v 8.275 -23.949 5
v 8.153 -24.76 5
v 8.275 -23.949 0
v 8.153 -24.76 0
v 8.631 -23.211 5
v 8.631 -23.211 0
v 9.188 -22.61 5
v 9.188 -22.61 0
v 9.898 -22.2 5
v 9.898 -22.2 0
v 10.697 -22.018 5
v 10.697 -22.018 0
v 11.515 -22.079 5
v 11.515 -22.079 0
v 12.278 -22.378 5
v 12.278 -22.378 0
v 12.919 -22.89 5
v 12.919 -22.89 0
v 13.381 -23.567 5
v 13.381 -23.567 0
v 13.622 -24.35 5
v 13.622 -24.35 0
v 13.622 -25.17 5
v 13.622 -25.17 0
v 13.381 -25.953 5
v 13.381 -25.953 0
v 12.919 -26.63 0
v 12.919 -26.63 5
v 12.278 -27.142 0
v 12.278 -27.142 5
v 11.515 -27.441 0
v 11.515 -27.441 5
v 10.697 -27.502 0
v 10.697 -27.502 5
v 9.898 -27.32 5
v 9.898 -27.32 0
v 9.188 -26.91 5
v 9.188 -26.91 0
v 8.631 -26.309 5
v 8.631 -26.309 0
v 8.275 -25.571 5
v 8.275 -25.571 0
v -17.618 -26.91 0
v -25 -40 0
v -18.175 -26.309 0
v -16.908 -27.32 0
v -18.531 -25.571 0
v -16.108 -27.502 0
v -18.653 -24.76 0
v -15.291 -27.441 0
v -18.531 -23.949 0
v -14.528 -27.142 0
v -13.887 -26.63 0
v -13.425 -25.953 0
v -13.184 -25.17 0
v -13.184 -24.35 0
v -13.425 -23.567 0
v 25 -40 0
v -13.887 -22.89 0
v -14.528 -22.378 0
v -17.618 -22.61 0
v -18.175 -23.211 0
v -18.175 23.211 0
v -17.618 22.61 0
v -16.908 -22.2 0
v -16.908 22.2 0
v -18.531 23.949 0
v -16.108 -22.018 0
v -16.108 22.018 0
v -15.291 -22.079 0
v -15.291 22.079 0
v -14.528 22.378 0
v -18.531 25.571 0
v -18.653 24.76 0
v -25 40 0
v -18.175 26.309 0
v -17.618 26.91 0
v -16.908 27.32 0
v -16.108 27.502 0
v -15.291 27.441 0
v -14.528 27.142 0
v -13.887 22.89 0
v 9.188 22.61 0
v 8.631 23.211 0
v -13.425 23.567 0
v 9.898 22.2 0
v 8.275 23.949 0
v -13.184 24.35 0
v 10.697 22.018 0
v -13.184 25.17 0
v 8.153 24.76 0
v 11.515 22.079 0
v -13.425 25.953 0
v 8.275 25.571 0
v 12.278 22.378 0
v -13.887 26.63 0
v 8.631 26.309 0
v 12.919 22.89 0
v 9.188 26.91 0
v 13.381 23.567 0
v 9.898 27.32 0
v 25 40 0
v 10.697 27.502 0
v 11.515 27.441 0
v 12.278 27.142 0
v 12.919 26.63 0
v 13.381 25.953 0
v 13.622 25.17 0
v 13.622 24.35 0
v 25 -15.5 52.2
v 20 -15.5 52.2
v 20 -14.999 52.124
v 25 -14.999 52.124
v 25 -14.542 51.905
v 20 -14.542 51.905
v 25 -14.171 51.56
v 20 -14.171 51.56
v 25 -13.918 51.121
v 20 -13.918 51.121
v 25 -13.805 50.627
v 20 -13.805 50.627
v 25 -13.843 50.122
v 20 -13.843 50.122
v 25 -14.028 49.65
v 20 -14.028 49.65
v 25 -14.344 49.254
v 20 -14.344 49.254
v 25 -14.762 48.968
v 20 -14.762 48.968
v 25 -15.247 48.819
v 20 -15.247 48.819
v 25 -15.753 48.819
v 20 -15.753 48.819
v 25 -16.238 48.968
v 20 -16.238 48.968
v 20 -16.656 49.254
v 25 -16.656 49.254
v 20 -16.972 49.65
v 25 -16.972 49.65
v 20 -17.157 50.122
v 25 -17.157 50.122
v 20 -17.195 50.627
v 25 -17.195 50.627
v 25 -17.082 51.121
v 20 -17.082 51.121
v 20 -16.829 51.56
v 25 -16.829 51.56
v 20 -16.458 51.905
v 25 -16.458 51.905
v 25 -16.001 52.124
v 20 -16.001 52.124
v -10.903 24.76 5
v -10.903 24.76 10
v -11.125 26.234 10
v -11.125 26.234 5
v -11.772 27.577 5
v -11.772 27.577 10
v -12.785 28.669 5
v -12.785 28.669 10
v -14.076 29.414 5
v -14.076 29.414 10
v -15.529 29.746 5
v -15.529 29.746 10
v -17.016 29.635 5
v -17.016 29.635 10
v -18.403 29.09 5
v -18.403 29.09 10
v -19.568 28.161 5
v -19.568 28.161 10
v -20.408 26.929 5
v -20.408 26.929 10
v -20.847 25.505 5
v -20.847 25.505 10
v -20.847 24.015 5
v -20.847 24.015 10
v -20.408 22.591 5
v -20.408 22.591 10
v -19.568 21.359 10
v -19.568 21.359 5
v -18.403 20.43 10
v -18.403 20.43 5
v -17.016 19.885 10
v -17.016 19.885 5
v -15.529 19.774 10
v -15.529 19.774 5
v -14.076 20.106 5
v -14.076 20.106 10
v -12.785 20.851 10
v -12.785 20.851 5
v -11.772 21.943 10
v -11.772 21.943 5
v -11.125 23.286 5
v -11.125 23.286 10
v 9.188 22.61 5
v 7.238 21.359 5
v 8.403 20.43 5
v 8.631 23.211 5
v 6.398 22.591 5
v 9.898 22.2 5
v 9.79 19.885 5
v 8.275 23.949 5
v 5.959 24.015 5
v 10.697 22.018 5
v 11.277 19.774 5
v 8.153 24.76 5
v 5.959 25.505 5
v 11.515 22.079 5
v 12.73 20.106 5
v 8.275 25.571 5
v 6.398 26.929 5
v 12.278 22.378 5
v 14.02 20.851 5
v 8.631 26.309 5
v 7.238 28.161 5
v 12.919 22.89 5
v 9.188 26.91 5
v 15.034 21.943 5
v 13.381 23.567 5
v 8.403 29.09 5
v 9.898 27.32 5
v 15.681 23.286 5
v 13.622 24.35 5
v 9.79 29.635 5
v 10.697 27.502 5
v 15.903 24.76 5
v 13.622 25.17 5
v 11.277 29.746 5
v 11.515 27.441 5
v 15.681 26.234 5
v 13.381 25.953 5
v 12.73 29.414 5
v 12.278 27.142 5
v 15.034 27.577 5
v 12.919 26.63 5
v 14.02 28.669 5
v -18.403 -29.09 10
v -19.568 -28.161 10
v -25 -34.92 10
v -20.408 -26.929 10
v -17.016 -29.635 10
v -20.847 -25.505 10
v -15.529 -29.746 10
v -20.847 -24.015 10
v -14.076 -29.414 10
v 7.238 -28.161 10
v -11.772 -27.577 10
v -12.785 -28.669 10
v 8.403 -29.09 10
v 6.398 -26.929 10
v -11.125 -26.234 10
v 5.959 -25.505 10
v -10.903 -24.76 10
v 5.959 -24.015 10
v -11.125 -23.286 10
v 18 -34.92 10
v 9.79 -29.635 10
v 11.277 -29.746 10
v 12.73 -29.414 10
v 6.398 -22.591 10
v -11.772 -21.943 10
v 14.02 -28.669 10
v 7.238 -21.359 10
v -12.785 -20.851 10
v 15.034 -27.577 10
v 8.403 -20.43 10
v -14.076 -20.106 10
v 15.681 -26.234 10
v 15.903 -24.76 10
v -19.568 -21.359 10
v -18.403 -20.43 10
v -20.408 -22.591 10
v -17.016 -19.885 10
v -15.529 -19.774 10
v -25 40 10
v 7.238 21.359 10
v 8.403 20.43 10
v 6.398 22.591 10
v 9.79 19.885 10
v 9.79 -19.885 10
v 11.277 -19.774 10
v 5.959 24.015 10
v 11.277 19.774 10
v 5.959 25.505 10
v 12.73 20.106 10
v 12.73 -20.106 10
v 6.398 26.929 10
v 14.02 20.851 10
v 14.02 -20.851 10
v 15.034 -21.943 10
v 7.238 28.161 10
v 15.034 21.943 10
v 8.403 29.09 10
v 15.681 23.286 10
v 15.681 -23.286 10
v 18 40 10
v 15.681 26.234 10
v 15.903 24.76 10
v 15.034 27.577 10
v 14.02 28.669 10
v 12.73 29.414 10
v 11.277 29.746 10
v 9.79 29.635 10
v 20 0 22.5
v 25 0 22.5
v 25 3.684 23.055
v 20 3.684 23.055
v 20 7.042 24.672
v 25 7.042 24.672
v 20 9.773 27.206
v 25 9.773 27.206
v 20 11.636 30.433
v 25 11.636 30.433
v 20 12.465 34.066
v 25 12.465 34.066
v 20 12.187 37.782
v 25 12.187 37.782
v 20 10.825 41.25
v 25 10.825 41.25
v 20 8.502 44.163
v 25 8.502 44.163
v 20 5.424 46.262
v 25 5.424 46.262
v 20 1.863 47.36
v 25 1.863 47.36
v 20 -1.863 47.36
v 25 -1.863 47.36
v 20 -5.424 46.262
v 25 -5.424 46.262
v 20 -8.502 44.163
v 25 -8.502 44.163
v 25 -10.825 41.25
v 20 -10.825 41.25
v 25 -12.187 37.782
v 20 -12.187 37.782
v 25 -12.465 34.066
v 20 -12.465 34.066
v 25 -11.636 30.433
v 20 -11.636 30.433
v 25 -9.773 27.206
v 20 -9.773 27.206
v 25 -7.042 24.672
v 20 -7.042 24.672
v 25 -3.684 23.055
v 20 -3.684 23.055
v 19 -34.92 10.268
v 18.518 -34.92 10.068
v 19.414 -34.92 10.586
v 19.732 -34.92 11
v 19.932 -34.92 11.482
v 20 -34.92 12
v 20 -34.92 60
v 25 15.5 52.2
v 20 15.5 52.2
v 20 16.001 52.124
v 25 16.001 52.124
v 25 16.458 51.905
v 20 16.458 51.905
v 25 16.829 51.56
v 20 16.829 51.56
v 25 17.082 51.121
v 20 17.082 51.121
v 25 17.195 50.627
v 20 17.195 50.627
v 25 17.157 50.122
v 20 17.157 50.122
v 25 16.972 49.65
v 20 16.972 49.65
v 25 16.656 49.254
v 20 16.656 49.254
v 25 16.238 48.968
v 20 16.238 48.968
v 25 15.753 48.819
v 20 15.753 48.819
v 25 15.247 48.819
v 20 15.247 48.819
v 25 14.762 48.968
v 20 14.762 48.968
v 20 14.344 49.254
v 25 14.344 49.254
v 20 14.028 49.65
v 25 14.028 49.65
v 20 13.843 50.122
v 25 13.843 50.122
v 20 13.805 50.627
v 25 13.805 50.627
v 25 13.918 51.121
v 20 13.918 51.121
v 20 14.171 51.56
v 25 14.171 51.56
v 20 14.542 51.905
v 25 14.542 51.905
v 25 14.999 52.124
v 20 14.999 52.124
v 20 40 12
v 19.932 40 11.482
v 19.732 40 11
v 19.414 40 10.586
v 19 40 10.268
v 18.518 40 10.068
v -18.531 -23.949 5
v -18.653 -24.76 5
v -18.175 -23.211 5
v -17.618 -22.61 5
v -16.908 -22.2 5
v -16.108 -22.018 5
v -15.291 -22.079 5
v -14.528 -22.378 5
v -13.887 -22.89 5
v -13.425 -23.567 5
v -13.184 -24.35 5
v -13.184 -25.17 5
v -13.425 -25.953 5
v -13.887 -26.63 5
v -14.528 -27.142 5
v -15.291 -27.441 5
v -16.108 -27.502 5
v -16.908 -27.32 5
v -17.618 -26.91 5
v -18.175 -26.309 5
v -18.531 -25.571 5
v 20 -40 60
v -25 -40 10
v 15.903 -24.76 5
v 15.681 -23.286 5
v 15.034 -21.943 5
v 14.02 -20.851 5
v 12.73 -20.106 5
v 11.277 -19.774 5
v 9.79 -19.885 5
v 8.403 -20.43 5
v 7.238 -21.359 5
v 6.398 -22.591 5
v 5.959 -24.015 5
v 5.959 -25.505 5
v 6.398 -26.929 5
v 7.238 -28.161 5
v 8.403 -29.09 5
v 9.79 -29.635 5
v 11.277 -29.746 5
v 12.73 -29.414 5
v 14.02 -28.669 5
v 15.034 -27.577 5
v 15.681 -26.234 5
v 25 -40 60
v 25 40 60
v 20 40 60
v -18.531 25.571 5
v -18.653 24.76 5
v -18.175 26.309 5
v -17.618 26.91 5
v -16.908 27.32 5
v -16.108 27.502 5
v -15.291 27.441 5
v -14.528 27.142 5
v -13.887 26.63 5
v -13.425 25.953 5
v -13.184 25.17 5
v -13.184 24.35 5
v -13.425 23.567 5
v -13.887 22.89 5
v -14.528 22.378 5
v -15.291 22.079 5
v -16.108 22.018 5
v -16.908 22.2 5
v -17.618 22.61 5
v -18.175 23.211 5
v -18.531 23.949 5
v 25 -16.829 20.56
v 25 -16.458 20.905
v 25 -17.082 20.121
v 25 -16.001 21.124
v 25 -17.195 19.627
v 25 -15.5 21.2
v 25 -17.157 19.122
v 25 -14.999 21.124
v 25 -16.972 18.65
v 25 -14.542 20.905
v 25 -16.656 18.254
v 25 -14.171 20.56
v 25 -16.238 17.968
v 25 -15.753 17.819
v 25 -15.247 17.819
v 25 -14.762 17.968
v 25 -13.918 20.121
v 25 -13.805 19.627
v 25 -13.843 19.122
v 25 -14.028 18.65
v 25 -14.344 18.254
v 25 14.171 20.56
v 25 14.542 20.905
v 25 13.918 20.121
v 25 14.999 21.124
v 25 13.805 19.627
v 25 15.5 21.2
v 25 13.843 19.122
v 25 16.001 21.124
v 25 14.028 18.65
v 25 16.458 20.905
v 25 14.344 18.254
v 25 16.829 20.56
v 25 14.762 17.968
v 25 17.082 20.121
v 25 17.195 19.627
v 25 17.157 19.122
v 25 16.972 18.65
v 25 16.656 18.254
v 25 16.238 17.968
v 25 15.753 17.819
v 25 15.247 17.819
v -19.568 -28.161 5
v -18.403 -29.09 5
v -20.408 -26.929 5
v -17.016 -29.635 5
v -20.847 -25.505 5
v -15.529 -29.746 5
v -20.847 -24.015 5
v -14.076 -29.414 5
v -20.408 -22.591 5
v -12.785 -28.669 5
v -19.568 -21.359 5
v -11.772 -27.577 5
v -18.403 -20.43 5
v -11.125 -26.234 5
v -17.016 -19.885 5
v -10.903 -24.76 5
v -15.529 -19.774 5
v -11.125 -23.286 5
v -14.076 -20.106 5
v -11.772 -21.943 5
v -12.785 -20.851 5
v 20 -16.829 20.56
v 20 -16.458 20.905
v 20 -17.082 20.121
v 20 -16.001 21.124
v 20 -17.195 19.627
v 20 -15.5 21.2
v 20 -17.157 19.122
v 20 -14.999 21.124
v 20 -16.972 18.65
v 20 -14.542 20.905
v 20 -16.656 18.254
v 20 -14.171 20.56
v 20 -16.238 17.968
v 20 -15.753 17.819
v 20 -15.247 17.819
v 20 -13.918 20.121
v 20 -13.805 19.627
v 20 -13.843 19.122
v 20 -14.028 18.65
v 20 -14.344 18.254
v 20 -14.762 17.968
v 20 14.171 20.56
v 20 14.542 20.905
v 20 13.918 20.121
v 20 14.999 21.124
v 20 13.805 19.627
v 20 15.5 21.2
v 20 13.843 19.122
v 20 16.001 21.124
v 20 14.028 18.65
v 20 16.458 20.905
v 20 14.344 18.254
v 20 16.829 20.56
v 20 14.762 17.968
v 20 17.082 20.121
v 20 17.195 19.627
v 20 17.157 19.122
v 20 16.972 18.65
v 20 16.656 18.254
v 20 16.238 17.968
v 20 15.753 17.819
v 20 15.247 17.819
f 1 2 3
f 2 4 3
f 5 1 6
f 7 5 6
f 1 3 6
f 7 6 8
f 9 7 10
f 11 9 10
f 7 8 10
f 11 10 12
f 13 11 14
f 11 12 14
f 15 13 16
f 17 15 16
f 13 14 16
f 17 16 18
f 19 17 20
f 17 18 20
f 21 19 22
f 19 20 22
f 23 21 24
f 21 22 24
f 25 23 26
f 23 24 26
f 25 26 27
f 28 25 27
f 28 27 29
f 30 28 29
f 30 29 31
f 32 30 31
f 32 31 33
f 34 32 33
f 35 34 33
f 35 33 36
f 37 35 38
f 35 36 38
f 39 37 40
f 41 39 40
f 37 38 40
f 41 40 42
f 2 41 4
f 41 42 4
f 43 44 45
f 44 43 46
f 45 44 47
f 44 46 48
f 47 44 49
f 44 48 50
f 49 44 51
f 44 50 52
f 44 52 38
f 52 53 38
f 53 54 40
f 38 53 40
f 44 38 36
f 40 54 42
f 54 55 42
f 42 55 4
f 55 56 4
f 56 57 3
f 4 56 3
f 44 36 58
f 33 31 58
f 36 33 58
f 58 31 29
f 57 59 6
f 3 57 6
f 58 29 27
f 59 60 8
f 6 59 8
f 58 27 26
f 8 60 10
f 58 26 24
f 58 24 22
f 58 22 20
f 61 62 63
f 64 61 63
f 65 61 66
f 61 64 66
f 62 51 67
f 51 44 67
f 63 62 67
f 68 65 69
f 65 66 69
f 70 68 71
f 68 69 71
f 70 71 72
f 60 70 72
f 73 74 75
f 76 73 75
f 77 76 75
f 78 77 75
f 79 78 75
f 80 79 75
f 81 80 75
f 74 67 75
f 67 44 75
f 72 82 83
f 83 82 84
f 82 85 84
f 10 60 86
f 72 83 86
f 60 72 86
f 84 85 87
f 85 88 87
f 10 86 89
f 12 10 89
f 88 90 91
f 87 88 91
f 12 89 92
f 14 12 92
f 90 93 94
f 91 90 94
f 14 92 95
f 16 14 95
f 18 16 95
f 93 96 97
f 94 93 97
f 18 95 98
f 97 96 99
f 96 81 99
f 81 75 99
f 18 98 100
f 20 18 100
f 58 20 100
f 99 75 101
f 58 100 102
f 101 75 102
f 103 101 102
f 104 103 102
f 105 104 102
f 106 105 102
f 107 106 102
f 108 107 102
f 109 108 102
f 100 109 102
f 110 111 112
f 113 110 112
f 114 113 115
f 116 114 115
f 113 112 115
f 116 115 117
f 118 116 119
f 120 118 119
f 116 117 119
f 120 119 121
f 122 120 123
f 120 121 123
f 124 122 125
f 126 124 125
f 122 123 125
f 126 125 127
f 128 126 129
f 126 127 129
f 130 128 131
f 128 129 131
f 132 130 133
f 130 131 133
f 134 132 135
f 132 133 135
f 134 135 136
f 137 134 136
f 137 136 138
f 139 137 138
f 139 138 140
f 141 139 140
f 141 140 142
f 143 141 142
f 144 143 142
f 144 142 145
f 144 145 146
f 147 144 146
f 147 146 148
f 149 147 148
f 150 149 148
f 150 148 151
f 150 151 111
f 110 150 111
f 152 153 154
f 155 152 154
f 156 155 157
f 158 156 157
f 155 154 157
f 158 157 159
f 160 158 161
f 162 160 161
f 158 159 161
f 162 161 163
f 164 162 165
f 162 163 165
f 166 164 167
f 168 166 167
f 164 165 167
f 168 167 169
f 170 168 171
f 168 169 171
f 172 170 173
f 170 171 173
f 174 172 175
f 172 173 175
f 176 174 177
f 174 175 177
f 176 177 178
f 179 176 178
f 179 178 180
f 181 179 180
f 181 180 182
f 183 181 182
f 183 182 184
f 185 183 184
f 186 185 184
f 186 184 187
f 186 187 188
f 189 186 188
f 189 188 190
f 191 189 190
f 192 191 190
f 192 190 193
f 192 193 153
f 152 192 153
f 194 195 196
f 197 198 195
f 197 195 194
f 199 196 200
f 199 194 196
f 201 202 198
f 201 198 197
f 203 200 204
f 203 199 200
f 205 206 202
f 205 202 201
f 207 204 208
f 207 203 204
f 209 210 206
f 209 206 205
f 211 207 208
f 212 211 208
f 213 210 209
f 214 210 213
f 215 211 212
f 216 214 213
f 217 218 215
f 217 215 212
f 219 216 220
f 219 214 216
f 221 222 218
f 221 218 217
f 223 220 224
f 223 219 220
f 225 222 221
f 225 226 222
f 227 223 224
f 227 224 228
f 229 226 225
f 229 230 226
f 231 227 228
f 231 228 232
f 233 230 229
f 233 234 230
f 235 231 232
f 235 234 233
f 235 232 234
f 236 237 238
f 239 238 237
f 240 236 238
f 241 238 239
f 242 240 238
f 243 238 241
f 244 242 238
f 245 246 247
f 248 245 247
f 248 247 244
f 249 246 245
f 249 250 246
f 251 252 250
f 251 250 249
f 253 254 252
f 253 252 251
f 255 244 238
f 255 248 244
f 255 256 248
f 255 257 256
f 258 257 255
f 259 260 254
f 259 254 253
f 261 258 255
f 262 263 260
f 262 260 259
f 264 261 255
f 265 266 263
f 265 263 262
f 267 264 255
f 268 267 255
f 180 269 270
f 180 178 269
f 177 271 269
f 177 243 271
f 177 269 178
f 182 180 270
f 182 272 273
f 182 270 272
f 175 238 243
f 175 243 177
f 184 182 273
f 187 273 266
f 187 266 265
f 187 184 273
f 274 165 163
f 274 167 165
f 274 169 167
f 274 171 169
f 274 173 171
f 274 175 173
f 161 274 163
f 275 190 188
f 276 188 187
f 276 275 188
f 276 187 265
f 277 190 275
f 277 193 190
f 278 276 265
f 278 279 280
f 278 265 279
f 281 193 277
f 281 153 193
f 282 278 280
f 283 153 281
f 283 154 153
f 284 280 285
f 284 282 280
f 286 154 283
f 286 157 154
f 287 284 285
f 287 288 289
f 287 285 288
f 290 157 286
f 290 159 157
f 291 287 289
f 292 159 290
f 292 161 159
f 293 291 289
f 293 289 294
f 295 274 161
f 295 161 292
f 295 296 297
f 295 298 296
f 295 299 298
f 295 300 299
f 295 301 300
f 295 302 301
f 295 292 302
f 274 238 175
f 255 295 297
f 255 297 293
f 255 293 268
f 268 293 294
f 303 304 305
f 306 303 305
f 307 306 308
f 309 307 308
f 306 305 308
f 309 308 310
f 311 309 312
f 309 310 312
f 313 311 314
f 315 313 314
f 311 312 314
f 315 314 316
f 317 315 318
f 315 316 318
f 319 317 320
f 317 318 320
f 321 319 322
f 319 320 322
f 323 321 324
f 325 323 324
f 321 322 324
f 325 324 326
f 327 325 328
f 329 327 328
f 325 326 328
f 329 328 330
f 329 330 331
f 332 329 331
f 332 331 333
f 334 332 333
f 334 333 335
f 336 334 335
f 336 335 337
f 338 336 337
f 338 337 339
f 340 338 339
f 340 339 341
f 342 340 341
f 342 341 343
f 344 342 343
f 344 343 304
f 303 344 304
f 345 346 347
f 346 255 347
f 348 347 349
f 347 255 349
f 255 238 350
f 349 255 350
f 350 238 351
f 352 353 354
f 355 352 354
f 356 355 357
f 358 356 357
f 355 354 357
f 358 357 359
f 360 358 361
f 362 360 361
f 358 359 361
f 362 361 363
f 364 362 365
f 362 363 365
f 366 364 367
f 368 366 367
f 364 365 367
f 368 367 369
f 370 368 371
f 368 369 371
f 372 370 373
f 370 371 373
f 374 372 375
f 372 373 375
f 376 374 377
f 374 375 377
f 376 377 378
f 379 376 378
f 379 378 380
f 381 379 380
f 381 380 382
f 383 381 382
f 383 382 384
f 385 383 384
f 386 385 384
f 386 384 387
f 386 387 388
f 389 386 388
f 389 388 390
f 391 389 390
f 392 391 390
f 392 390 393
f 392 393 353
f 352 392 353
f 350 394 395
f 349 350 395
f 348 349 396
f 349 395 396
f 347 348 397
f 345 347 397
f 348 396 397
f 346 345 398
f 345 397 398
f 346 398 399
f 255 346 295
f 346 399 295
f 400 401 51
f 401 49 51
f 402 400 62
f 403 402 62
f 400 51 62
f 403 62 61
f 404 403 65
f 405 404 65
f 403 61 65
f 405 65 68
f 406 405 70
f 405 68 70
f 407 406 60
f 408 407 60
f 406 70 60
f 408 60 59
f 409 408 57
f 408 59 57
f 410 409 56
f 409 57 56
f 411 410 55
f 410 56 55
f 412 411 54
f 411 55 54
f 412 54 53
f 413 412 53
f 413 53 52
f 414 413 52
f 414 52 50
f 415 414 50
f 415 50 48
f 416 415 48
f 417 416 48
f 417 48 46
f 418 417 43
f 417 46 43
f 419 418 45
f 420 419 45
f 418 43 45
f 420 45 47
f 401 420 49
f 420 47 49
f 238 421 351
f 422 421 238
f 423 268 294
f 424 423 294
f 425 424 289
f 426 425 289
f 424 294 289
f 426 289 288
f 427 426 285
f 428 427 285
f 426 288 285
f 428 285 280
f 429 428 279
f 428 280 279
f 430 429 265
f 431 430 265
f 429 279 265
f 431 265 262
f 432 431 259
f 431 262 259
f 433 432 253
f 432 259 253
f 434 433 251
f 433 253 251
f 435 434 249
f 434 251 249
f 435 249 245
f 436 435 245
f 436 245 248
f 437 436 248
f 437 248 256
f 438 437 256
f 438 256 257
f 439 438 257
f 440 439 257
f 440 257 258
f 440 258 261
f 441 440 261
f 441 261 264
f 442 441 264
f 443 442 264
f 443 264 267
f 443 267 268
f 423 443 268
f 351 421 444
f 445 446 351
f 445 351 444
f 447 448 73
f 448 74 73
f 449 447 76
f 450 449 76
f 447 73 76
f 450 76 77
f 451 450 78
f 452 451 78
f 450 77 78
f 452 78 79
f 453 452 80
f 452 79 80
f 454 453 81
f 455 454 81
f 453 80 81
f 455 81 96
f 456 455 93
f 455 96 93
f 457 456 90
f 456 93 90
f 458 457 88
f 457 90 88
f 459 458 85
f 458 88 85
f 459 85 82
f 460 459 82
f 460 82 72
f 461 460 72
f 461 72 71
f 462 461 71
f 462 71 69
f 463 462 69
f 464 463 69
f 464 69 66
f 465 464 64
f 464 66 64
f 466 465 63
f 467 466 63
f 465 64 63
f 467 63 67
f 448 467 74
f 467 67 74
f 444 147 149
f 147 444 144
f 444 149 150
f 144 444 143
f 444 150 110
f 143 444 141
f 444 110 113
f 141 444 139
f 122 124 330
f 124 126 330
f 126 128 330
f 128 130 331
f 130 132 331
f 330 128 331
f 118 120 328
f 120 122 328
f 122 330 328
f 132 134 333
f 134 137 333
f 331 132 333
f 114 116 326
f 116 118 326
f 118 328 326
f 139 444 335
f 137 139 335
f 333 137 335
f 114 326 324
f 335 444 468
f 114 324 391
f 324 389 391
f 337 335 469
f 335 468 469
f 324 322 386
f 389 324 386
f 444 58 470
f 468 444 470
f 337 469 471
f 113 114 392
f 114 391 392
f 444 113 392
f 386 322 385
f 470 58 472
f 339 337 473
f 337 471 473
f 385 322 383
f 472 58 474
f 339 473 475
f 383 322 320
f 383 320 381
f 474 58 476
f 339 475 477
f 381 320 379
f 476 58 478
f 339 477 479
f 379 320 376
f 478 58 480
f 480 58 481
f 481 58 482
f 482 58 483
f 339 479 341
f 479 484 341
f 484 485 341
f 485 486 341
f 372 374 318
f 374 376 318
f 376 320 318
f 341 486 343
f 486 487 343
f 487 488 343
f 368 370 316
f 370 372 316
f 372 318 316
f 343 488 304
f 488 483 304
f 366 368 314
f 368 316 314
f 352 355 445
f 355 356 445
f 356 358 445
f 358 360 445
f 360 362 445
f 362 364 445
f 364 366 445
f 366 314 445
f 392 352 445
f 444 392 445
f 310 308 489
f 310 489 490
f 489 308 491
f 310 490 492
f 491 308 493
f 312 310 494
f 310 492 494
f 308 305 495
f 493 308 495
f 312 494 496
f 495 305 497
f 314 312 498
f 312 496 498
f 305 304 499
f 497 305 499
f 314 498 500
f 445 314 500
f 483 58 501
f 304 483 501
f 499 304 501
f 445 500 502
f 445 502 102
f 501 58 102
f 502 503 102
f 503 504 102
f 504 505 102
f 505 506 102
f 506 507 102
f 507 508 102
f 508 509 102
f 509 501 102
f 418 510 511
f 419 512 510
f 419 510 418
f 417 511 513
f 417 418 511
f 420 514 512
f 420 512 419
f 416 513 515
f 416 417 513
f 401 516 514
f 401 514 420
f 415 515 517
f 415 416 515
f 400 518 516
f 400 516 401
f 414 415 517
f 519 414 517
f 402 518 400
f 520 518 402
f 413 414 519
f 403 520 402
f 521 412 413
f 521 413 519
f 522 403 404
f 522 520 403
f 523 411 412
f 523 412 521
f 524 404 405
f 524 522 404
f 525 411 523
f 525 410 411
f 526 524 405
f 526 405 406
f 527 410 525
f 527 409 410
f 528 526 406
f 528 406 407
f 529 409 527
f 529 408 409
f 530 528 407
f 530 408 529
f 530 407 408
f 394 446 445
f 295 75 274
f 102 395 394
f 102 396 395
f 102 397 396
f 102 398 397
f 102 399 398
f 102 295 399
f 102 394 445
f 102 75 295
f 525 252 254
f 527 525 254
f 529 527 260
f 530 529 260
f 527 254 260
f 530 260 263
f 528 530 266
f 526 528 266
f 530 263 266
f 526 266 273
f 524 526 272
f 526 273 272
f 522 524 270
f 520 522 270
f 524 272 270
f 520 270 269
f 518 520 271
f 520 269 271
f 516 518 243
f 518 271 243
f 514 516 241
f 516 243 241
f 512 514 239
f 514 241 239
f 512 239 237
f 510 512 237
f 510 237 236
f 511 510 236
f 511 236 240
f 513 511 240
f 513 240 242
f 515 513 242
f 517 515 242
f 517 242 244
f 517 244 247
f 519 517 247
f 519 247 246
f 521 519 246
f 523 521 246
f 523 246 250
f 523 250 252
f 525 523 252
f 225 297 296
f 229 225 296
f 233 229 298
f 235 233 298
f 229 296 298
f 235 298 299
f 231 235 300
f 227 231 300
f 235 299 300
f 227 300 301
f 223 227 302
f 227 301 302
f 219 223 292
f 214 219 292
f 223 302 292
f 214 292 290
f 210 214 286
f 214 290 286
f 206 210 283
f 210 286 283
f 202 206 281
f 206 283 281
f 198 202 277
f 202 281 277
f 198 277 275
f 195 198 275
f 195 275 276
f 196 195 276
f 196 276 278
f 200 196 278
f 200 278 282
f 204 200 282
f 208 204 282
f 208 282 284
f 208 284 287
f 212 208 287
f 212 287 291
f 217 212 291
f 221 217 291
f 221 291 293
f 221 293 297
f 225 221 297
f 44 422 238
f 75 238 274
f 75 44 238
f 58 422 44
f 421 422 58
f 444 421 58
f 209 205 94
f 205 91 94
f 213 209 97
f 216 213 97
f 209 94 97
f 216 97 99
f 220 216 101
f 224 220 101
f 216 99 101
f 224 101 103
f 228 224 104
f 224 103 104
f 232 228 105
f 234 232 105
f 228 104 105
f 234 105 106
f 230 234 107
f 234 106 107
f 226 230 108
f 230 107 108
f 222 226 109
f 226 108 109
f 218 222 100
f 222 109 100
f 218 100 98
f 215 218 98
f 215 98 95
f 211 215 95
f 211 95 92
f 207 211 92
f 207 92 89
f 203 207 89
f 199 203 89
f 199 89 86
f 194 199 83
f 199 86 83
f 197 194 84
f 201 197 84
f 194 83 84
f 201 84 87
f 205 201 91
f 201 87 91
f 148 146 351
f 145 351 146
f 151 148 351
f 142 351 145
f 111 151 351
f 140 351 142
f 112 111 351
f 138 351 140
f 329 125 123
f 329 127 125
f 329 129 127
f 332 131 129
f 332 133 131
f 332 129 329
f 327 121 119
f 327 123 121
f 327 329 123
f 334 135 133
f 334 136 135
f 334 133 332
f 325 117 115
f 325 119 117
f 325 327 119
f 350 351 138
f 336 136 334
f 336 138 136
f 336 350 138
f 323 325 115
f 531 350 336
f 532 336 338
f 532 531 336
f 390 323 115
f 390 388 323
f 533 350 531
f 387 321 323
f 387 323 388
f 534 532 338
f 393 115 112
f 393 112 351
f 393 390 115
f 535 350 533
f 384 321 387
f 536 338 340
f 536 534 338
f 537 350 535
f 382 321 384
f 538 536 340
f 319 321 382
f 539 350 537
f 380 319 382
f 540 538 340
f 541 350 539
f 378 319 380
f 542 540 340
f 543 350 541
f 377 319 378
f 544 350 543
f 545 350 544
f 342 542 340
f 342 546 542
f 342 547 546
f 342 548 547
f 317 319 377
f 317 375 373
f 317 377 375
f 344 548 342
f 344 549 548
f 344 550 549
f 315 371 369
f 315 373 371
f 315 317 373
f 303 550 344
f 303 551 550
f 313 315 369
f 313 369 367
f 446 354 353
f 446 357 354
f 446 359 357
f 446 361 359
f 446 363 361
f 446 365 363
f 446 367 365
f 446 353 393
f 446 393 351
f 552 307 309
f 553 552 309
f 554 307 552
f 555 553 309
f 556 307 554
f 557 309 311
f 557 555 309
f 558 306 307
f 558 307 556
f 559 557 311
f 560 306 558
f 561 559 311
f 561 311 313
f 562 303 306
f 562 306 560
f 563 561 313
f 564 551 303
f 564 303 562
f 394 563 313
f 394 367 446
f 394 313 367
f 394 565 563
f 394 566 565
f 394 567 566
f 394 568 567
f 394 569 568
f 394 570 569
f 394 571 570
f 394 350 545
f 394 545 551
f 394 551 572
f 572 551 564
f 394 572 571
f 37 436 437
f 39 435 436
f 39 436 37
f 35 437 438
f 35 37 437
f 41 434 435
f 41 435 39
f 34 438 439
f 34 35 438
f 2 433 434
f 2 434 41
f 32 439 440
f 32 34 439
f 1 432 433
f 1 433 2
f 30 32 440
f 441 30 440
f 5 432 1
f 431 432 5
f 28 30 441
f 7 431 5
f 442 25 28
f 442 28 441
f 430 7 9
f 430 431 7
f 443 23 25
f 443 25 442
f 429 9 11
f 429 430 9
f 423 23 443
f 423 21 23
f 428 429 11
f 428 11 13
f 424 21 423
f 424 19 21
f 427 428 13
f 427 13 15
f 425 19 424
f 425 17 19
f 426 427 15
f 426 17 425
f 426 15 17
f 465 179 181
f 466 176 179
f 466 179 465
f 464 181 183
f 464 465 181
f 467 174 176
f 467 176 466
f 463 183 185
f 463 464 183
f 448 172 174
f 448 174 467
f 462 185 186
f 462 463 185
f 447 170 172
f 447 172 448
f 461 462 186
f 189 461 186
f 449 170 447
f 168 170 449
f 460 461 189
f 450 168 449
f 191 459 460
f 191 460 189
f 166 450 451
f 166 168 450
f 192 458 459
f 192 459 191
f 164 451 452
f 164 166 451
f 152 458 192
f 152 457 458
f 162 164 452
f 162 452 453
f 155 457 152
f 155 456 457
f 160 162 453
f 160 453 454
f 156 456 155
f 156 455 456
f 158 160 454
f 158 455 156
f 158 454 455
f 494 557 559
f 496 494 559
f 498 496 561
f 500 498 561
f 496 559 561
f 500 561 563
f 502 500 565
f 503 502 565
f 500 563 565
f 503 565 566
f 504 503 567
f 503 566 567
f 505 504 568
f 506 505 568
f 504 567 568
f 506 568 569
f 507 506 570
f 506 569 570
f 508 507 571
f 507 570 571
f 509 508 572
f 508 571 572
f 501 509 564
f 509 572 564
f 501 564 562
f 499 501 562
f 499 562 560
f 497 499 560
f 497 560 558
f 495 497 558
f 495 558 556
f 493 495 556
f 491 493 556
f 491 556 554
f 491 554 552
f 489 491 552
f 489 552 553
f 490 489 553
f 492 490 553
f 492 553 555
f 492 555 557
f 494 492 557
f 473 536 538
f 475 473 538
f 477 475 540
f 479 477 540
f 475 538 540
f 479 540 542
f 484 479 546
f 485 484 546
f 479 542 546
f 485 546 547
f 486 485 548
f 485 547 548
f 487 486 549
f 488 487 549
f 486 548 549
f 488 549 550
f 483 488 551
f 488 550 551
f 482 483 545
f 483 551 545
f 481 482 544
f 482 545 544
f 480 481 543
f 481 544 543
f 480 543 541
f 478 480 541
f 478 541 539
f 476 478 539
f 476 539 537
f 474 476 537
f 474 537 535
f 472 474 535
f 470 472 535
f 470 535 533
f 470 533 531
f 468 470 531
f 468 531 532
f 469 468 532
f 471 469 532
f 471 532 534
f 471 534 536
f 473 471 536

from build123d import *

# Parameters (mm, degrees)
SKETCH1_W                      = 50
SKETCH1_H                      = 80
BOSS_EXTRUDE1_DEPTH            = 10
SKETCH2_W                      = 5
SKETCH2_H                      = 80
BOSS_EXTRUDE2_DEPTH            = 50
SKETCH3_R                      = 12.5
CUT_EXTRUDE1_DEPTH             = 88.749643874
M3_CLEARANCE_HOLE1_D           = 3.4
CBORE_FOR_M5_SHCS1_D           = 5.5
CBORE_FOR_M5_SHCS1_CBORE_D     = 10
CBORE_FOR_M5_SHCS1_CBORE_DEPTH = 5
FILLET11_R                     = 2
BOSS_EXTRUDE3_DEPTH            = 5.08


with BuildPart() as part:
    # Sketch1 → Boss-Extrude1 (new body)
    with BuildSketch(Plane.XY):
        Rectangle(SKETCH1_W, SKETCH1_H)
    extrude(amount=BOSS_EXTRUDE1_DEPTH)

    # Sketch2 → Boss-Extrude2 (add)
    with BuildSketch(Plane.XY.offset(10)):
        with Locations((22.5, 0)):
            Rectangle(SKETCH2_W, SKETCH2_H)
    extrude(amount=BOSS_EXTRUDE2_DEPTH)

    # Sketch3 → Cut-Extrude1 (cut, through all)
    with BuildSketch(Plane(origin=(25, 0, 0), x_dir=(0, 0, -1), z_dir=(1, 0, 0))):
        with Locations((-35, 0)):
            Circle(SKETCH3_R)
    extrude(amount=-CUT_EXTRUDE1_DEPTH, mode=Mode.SUBTRACT)

    # M3 Clearance Hole1 (through all)
    with Locations(Plane(origin=(25, 0, 0), x_dir=(0, 0, -1), z_dir=(1, 0, 0))):
        with Locations((-50.5, -15.5), (-35, 0), (-50.5, 15.5), (-19.5, -15.5), (-19.5, 15.5)):
            Hole(M3_CLEARANCE_HOLE1_D / 2)

    # CBORE for M5 SHCS1 (through all)
    with Locations(Plane.XY.offset(10)):
        with Locations((-15.902931391, 24.76), (10.902931391, 24.76), (-15.902931391, -24.76), (10.902931391, -24.76)):
            CounterBoreHole(CBORE_FOR_M5_SHCS1_D / 2, CBORE_FOR_M5_SHCS1_CBORE_D / 2, CBORE_FOR_M5_SHCS1_CBORE_DEPTH)

    # Fillet11
    fillet11_edges = [part.edges().sort_by_distance(p)[0] for p in [
        (20, 0, 10),
    ]]
    fillet(fillet11_edges, radius=FILLET11_R)

    # Sketch8 → Boss-Extrude3 (add)
    with BuildSketch(Plane.XZ.offset(40)):
        Polygon((20, 60), (-25, 10), (20, 10), align=None)
    extrude(amount=-BOSS_EXTRUDE3_DEPTH)


solid = part.part
